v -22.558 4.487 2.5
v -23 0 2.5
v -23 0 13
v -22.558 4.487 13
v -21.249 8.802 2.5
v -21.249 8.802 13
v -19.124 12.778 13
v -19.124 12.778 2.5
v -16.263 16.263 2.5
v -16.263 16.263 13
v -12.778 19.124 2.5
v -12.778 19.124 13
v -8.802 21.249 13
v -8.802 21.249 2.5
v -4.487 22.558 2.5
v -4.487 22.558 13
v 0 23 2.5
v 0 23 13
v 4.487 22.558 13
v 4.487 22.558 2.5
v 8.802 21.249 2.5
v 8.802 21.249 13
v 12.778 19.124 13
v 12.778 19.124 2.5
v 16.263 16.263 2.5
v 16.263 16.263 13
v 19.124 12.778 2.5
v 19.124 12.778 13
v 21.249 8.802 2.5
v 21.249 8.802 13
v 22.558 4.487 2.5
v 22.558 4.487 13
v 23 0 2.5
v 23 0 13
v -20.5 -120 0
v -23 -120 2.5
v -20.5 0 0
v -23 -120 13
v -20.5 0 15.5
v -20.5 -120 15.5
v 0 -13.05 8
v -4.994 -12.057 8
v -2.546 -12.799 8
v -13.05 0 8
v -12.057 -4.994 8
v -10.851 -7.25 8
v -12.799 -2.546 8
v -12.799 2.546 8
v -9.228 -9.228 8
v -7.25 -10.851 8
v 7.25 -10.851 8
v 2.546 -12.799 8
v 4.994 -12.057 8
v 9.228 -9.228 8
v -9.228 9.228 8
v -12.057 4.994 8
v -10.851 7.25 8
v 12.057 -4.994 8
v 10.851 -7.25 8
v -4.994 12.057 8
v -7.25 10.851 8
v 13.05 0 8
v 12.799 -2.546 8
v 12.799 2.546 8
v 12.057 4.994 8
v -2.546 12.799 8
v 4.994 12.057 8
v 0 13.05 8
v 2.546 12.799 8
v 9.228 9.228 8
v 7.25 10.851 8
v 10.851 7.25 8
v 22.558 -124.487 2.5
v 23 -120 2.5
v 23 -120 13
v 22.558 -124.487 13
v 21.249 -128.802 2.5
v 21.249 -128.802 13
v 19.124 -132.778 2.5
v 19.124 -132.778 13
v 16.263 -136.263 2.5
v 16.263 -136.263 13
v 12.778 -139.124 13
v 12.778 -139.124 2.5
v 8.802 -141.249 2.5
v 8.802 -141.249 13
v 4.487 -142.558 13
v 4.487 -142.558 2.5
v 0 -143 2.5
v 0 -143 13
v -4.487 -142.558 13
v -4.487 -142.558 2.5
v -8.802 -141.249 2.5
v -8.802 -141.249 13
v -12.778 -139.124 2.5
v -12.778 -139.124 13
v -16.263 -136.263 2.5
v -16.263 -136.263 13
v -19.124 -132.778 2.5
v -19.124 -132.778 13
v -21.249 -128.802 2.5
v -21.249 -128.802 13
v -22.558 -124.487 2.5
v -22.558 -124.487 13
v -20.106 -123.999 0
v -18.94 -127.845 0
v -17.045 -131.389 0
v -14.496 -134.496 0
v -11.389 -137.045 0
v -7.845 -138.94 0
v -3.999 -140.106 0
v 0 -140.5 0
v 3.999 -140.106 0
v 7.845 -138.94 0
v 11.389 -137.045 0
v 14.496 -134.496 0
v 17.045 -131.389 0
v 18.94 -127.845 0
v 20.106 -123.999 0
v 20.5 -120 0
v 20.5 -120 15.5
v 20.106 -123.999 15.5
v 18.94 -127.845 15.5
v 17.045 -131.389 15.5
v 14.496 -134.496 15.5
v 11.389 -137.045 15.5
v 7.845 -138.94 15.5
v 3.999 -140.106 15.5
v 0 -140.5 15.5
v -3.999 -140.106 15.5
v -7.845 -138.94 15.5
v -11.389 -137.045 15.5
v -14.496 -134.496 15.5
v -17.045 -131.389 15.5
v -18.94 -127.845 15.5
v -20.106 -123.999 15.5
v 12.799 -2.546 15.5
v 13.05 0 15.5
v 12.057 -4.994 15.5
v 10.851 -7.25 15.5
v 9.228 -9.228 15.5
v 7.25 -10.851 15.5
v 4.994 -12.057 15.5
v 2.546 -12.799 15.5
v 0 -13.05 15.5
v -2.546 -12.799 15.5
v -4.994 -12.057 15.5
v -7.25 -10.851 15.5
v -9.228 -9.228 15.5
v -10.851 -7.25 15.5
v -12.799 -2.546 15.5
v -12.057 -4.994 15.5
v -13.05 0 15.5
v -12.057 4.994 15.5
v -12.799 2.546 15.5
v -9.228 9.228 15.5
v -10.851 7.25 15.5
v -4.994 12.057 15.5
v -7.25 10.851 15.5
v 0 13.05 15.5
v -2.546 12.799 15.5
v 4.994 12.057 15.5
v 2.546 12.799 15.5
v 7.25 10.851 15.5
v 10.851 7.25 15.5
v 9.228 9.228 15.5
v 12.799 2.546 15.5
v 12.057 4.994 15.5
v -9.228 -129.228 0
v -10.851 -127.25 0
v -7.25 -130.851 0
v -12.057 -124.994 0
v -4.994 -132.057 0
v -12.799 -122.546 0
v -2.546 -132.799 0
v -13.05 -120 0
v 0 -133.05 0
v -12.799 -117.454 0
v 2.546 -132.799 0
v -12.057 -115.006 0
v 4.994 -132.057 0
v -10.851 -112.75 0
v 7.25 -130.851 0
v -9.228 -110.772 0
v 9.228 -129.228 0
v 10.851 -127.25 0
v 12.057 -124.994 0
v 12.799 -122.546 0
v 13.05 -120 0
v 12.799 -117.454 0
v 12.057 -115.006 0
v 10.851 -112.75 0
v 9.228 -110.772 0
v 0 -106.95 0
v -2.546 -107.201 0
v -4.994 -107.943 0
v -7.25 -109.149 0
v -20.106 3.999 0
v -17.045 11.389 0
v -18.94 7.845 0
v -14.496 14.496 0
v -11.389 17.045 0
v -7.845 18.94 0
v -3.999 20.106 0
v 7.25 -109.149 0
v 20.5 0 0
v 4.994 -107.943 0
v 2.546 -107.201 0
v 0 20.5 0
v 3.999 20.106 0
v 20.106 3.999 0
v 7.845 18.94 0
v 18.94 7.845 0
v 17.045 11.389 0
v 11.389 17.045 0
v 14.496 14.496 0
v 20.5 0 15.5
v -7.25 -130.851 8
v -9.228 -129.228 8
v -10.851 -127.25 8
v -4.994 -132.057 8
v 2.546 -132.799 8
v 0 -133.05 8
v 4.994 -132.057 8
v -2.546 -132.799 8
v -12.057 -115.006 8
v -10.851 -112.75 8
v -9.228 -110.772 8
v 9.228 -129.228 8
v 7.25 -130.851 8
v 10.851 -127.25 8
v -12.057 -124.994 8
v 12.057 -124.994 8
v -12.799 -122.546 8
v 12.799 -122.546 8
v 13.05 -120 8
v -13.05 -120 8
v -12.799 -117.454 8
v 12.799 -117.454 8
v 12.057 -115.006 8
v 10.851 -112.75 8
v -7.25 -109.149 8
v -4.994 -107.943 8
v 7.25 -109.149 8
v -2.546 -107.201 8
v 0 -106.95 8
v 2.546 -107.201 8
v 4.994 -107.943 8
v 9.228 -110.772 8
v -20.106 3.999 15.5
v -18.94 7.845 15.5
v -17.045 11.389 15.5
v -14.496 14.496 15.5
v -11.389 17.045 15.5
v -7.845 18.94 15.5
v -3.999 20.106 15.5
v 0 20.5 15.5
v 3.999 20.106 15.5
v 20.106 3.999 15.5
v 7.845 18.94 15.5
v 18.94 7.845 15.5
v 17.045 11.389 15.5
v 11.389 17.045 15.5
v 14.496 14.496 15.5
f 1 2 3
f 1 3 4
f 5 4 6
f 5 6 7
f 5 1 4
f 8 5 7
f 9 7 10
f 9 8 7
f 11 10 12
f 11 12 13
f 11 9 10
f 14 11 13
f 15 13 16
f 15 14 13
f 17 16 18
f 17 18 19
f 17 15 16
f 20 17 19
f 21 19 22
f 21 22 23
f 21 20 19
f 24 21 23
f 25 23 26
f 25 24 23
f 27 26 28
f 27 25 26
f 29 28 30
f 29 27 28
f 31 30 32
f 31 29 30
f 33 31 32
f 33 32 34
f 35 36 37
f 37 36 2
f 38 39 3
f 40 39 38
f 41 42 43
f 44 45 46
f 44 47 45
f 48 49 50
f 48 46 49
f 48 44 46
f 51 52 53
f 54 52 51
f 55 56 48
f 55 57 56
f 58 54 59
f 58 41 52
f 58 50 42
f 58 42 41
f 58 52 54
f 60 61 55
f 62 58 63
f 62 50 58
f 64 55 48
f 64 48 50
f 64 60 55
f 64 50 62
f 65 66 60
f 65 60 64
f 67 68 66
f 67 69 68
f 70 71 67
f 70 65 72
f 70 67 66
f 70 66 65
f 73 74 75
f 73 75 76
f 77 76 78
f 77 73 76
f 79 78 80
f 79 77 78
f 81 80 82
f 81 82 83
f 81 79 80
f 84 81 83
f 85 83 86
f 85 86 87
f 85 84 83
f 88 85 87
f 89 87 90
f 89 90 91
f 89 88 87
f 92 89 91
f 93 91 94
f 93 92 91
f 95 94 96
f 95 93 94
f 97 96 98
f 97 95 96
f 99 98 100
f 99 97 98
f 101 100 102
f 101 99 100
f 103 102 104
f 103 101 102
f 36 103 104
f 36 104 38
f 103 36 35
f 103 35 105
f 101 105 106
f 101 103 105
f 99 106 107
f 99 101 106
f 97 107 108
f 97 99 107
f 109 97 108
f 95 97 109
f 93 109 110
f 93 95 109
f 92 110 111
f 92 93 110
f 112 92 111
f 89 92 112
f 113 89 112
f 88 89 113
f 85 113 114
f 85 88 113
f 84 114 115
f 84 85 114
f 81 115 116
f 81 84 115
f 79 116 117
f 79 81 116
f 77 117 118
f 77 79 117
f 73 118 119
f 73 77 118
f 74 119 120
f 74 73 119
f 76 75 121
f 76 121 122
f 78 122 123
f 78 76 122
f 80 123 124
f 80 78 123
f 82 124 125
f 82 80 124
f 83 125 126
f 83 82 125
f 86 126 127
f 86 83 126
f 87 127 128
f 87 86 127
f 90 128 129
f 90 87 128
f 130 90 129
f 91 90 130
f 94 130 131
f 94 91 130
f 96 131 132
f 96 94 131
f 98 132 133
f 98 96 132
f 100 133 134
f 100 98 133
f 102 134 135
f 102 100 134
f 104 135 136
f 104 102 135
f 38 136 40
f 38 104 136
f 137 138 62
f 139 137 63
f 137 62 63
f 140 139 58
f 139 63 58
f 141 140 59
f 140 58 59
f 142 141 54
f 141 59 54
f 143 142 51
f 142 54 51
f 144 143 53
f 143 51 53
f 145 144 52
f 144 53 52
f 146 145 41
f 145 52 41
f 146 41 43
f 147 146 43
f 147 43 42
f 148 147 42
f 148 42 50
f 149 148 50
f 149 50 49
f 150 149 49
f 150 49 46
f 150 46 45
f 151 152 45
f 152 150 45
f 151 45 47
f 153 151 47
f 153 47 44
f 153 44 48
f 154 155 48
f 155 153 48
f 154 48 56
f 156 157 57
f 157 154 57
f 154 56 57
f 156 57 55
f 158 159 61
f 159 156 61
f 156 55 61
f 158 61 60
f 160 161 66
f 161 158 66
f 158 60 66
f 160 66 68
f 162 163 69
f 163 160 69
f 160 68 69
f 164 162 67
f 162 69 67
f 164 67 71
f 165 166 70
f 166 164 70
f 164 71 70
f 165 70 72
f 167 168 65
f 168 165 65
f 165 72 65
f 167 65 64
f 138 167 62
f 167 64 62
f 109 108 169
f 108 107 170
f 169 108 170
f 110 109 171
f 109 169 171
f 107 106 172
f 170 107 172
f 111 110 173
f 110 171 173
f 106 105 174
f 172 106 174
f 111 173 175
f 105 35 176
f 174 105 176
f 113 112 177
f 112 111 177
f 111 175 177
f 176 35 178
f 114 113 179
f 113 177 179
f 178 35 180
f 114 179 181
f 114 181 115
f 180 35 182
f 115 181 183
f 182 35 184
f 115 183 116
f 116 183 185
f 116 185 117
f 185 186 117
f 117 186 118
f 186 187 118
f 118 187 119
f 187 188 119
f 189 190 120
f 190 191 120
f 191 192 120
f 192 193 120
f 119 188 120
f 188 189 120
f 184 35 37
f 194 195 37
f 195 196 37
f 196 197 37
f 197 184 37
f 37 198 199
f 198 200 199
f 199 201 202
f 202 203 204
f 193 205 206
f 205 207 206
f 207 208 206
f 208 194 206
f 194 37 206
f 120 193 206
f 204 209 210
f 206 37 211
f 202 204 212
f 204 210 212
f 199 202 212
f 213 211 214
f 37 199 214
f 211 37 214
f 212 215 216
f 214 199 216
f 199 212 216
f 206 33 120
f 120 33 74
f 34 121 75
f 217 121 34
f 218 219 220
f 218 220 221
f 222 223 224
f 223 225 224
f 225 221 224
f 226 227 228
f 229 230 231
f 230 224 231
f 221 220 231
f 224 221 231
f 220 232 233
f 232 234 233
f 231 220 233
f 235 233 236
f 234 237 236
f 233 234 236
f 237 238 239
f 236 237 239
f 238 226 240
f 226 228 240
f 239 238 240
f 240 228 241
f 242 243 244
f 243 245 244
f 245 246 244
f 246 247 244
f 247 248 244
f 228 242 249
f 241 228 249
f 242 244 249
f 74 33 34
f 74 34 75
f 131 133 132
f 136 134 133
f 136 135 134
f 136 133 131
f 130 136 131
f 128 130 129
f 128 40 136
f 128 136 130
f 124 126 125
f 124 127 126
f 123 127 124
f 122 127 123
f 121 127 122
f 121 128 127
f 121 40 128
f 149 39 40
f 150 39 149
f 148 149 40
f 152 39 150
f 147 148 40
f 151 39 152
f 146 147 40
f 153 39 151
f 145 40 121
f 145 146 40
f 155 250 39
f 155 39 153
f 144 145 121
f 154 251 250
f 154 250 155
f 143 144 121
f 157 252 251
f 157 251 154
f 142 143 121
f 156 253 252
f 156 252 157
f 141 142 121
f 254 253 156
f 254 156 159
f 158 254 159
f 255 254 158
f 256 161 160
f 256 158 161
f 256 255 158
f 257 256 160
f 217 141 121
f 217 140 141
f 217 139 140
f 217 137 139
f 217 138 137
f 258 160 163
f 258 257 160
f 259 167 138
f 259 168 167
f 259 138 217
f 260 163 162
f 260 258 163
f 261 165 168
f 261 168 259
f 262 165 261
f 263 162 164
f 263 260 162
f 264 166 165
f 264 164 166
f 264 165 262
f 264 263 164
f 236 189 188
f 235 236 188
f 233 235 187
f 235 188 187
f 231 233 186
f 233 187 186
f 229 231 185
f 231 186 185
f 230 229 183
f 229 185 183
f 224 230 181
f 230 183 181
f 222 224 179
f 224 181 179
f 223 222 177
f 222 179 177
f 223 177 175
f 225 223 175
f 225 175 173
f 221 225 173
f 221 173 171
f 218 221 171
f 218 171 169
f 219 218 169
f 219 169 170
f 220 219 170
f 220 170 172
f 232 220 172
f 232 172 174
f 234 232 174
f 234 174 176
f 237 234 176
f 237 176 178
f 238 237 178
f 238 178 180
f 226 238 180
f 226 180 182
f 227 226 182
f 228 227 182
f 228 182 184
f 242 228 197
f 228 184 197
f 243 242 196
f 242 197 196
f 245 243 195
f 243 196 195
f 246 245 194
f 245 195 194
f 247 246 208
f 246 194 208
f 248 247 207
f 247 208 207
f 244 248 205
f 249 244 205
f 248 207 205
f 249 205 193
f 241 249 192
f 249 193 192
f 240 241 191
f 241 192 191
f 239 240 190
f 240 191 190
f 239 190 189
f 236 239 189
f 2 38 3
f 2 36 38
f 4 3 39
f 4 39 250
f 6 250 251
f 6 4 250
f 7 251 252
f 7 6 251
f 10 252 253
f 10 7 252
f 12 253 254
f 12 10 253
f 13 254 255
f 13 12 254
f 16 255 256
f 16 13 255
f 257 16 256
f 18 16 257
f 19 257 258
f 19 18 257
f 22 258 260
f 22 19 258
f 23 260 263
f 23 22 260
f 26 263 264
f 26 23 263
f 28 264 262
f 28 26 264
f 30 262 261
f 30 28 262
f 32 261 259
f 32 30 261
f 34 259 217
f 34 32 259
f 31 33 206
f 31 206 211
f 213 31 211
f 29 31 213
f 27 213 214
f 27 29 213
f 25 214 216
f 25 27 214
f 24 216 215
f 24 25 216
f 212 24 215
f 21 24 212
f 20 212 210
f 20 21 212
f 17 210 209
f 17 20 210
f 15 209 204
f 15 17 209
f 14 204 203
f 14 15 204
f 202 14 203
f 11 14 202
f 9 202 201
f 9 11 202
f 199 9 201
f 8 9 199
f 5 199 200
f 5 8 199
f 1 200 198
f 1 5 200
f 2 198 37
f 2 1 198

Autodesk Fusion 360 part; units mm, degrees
sketch "main" plane through (0, 0, 0) normal (0, 0, 1) x (1, 0, 0) in component "crank-arm"
  circle A0 centre (0, 0) radius 13.05
  circle A1 centre (0, 0) radius 23
  line L0 (-23, 0) -> (23, 0)
  line L1 (23, 0) -> (23, -120)
  line L2 (23, -120) -> (-23, -120)
  line L3 (-23, -120) -> (-23, 0)
  circle A2 centre (0, -120) radius 23
  circle A3 centre (0, -120) radius 13.05
  dimension "d1" = 26.1
  dimension "d2" = 46
  dimension "d3" = 46
  dimension "d4" = 120
  dimension "d5" = 46
  dimension "d6" = 26.1
extrude "Extrude1" add sketch "main" along normal blind 8 contours A0 L0 | A0 A1 L0 | A0 A1 L0 | A0 L0 | A1 L1 L3 A2 | L2 A2 A3 | L2 A2 A3 in component "crank-arm"
extrude "Extrude2" add sketch "main" along normal blind 7.5 from surface at 8 contours A0 A1 L0 | A0 A1 L0 | A1 L1 L3 A2 | L2 A2 A3 | L2 A2 A3 | L2 A3 | L2 A3 in component "crank-arm"
chamfer "Chamfer1" distance 2.5 angle 45 8 edges at (-23, -60, 15.5) (0, -143, 15.5) (23, -60, 15.5) (0, 23, 15.5) (-23, -60, 0) (0, 23, 0) (23, -60, 0) (0, -143, 0) in component "crank-arm"
component "crank-arm" placed x (1, 0, 0) y (0, 1, 0) z (0, 0, 1) at (0, 0, 0)
equation "d1 = 26 mm + 0.1 mm"
equation "d6 = 26 mm + 0.1 mm"
equation "d10 = 8 mm - 0.5 mm"
